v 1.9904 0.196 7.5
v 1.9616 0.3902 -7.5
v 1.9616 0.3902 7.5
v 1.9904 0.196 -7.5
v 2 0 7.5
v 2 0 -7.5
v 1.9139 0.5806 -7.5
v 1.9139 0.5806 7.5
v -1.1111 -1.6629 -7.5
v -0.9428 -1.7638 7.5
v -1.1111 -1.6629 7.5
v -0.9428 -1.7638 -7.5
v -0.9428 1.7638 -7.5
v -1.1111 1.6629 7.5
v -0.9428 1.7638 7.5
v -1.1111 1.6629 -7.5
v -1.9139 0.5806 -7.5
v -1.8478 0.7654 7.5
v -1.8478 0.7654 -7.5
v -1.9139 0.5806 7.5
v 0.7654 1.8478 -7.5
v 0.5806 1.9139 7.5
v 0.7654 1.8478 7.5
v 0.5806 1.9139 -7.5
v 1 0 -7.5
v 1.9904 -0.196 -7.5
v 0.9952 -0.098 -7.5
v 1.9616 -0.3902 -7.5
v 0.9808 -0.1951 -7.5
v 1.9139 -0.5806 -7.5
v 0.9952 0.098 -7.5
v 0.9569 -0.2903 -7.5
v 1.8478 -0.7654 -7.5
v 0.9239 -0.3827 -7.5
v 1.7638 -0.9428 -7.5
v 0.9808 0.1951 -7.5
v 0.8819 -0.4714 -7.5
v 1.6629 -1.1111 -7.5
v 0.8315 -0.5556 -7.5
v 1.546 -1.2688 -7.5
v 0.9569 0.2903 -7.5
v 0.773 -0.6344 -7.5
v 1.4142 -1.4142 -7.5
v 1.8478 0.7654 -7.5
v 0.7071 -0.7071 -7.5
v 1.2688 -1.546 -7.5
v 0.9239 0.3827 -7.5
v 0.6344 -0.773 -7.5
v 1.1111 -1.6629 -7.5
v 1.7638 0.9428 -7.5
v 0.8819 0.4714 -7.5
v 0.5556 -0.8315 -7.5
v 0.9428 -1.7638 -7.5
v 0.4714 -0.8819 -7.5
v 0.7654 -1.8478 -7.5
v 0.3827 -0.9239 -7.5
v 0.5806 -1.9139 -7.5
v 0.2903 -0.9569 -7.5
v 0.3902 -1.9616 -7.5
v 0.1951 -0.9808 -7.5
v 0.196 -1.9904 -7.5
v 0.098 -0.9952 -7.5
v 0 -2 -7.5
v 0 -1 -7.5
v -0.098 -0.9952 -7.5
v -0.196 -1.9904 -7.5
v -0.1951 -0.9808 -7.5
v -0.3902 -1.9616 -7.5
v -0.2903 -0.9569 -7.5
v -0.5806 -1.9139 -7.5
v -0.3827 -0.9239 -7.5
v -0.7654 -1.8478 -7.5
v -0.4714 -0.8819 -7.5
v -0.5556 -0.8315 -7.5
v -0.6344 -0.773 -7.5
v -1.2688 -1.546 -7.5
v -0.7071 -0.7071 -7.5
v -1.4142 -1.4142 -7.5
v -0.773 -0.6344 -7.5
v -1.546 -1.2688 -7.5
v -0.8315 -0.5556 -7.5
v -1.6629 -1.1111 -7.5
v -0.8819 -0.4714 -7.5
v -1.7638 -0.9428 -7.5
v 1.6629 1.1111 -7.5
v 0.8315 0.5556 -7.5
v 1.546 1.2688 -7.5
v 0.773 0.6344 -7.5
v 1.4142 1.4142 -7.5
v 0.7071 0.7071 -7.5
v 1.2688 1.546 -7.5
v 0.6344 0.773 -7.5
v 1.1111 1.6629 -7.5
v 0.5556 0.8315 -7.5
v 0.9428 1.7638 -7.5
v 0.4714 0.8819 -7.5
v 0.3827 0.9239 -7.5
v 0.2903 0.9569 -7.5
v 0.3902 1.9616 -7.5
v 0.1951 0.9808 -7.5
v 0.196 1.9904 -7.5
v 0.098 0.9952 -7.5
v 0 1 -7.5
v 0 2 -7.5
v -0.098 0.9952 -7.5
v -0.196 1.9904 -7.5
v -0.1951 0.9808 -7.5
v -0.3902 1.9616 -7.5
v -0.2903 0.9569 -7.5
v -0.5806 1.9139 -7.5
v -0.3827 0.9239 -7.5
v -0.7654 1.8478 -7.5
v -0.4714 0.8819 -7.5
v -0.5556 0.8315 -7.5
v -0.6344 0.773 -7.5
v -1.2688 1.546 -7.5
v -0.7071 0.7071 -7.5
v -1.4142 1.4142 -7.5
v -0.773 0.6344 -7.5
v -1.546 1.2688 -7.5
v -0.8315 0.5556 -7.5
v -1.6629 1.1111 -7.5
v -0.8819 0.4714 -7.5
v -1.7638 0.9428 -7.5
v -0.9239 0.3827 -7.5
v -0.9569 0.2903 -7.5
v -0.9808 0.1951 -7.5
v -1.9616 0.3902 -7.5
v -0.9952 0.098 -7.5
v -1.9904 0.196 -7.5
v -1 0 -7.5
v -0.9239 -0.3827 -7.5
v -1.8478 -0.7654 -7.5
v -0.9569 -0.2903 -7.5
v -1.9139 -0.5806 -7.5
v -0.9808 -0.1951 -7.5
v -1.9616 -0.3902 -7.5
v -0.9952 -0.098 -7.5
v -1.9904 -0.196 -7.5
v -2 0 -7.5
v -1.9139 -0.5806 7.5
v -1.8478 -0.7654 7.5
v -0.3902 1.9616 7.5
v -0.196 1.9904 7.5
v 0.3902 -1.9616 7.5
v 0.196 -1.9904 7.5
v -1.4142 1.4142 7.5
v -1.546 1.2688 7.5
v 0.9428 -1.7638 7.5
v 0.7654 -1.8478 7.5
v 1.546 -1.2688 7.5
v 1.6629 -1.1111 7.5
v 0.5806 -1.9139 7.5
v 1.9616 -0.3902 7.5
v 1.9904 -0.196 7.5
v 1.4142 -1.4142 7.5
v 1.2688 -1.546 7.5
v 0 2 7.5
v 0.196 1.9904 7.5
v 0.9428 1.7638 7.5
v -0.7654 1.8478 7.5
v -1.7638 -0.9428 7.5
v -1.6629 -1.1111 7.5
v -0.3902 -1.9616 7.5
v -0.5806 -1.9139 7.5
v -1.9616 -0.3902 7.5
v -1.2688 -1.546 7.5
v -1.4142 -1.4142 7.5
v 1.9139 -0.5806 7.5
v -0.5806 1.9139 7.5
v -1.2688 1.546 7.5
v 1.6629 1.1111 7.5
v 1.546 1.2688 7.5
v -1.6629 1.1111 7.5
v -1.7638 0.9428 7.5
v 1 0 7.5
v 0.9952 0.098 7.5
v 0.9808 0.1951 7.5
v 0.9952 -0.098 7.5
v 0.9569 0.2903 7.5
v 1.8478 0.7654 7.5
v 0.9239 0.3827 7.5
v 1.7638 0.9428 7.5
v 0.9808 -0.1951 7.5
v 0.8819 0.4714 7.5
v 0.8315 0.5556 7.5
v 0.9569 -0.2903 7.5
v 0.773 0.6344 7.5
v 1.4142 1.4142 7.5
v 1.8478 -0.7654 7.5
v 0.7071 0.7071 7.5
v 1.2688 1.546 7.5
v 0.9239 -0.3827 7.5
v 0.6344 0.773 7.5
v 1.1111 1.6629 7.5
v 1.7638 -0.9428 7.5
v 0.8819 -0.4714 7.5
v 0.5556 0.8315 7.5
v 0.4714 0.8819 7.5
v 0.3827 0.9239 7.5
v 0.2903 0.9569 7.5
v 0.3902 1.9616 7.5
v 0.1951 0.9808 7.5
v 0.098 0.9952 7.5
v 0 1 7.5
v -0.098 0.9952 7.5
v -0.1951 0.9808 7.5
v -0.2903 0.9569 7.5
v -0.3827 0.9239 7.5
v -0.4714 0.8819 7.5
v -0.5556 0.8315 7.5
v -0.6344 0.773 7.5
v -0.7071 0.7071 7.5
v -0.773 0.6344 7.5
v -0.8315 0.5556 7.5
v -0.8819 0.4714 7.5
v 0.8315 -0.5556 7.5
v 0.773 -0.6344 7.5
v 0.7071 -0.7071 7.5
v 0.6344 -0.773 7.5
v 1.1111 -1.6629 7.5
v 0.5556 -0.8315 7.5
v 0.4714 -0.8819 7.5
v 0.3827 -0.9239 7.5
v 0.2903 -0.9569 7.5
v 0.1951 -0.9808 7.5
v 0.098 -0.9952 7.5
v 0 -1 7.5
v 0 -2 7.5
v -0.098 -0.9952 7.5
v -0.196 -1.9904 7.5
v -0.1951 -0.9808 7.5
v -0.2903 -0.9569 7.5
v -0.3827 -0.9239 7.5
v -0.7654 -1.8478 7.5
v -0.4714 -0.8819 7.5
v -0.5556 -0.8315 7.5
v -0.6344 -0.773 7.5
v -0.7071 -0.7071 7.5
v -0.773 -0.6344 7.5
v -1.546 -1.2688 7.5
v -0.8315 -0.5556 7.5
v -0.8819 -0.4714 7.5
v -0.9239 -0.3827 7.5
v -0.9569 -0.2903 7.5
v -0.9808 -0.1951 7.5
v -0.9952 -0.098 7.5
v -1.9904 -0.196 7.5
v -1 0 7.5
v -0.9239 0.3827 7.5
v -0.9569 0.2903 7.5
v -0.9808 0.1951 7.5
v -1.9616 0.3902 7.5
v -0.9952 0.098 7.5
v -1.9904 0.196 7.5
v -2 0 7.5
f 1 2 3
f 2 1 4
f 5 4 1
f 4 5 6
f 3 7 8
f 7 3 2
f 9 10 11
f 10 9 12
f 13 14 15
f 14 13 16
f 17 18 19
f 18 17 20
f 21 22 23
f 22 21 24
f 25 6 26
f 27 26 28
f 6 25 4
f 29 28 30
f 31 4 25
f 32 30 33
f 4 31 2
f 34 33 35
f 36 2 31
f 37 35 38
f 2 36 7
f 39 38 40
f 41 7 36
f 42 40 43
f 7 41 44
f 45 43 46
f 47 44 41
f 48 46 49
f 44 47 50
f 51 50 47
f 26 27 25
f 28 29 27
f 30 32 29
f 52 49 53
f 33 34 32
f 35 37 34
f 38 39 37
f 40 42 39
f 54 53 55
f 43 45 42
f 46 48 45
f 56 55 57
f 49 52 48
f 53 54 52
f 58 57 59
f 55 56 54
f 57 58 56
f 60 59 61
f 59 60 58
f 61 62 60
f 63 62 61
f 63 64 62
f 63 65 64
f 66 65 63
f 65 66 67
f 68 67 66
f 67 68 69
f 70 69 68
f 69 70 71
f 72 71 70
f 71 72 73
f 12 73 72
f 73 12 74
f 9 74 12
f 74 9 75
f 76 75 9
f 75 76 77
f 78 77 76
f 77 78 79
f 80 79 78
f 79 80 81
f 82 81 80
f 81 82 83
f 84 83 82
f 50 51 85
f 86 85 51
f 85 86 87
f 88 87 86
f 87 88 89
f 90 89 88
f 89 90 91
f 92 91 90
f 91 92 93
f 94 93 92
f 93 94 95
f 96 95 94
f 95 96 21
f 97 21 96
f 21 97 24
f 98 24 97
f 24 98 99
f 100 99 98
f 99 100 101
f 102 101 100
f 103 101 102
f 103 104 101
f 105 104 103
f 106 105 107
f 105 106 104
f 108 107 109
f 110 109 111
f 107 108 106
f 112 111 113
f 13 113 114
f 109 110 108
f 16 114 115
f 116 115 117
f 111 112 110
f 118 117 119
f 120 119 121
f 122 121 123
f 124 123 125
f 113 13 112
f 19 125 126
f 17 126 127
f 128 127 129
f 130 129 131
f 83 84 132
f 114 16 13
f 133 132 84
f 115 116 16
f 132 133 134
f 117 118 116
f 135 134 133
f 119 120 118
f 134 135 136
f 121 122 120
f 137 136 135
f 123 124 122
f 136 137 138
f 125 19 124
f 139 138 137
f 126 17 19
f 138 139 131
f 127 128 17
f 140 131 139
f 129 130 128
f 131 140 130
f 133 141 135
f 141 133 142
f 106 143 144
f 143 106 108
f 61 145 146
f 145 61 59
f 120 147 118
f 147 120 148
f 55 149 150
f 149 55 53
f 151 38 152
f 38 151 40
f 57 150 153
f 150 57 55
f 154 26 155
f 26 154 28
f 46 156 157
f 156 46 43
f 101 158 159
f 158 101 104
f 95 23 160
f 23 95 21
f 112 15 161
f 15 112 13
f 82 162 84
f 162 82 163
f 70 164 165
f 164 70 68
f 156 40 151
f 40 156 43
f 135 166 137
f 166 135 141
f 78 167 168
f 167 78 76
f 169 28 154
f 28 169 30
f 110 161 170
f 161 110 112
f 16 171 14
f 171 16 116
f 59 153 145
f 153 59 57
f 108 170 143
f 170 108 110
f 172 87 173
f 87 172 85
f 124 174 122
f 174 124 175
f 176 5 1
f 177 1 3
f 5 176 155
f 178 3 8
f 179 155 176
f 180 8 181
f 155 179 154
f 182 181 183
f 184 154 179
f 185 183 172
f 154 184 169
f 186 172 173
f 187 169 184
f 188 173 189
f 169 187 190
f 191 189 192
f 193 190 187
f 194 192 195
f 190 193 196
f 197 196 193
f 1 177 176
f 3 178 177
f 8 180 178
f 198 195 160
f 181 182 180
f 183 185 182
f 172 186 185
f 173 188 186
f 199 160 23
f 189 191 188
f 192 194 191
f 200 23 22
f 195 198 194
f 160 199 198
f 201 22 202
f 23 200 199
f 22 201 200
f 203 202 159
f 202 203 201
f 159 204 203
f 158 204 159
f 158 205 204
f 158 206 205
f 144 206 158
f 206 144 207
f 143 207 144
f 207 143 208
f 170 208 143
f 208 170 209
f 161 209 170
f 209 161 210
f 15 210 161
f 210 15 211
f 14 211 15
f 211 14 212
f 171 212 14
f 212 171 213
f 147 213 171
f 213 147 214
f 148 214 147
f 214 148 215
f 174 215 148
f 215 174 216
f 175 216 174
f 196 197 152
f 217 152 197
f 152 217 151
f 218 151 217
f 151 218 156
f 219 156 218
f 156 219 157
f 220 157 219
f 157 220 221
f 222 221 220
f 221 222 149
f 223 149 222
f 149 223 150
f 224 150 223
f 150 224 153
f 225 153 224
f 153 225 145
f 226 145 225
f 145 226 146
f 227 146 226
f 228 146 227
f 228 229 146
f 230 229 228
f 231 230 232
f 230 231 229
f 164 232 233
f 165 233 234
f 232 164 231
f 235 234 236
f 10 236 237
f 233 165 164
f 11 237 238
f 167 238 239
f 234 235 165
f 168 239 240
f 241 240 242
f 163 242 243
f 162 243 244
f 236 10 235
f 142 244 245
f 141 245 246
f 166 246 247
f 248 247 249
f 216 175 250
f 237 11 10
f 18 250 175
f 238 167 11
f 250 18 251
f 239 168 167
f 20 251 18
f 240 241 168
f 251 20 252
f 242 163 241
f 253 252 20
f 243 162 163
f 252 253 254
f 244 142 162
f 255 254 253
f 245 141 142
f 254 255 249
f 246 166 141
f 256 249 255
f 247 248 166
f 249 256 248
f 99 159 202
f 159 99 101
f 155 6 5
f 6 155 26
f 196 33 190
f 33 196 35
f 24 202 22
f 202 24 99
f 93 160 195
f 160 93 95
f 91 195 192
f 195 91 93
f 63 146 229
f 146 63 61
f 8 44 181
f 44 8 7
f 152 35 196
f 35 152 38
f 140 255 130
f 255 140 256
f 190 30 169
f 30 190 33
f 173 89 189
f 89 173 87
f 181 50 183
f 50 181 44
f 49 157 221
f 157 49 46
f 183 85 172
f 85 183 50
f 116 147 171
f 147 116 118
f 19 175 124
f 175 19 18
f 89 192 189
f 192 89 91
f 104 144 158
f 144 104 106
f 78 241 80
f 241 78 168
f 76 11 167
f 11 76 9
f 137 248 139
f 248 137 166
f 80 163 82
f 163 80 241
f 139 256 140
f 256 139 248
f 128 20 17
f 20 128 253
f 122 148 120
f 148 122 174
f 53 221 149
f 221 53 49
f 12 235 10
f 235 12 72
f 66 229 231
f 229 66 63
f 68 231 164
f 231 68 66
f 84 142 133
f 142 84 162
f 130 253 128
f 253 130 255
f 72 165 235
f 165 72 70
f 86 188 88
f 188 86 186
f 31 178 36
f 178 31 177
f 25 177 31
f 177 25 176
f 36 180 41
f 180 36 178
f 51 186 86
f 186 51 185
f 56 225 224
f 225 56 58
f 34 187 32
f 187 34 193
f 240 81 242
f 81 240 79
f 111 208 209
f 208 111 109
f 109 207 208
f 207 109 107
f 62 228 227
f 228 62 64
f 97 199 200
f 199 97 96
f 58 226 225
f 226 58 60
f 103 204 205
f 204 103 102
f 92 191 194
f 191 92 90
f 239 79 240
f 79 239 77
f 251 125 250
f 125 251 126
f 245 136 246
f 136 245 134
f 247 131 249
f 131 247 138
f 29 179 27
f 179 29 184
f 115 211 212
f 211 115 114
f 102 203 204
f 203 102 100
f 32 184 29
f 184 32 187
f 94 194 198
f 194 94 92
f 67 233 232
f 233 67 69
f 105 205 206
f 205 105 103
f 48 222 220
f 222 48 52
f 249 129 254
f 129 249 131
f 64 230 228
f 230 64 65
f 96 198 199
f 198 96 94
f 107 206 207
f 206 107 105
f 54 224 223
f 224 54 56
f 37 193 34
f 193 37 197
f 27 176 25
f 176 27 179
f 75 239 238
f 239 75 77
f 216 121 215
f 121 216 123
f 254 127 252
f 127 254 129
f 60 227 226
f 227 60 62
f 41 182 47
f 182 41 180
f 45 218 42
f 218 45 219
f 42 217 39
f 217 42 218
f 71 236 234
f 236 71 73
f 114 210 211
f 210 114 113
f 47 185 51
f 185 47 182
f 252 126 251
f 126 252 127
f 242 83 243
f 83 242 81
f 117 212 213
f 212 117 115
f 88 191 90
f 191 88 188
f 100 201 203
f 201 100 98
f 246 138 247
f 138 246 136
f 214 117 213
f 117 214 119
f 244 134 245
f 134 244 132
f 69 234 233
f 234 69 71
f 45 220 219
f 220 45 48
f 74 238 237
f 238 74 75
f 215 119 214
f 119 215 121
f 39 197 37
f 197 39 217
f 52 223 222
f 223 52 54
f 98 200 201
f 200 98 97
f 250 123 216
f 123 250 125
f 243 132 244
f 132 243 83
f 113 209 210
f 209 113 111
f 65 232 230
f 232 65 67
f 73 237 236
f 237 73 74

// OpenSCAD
// Parameters
length = 15; //[7.5:30:0.5]
outer_diameter = 4; //[2:8:0.1]
inner_diameter = 2; //[1:6:0.1]
forced_id = 0; //[0:6:0.1]
center = 1; //[0:1:1]
eps_overlap = 0.5; //[0.2:2:0.1]

// PTFE Tubing - complete geometry
module tubing() {
  color([0.85, 0.85, 0.8]) { // Off-white for PTFE
    difference() {
      // Outer tube
      translate([0, 0, center == 1 ? 0 : length / 2])
        cylinder(h=length, r=outer_diameter / 2, center=true, $fn=64);
      
      // Inner bore
      translate([0, 0, center == 1 ? 0 : length / 2])
        cylinder(h=length + 2 * eps_overlap, r=(forced_id > 0 ? forced_id : inner_diameter) / 2, center=true, $fn=64);
    }
  }
}

// Assembly
module assembly() {
  tubing();
}

assembly();
